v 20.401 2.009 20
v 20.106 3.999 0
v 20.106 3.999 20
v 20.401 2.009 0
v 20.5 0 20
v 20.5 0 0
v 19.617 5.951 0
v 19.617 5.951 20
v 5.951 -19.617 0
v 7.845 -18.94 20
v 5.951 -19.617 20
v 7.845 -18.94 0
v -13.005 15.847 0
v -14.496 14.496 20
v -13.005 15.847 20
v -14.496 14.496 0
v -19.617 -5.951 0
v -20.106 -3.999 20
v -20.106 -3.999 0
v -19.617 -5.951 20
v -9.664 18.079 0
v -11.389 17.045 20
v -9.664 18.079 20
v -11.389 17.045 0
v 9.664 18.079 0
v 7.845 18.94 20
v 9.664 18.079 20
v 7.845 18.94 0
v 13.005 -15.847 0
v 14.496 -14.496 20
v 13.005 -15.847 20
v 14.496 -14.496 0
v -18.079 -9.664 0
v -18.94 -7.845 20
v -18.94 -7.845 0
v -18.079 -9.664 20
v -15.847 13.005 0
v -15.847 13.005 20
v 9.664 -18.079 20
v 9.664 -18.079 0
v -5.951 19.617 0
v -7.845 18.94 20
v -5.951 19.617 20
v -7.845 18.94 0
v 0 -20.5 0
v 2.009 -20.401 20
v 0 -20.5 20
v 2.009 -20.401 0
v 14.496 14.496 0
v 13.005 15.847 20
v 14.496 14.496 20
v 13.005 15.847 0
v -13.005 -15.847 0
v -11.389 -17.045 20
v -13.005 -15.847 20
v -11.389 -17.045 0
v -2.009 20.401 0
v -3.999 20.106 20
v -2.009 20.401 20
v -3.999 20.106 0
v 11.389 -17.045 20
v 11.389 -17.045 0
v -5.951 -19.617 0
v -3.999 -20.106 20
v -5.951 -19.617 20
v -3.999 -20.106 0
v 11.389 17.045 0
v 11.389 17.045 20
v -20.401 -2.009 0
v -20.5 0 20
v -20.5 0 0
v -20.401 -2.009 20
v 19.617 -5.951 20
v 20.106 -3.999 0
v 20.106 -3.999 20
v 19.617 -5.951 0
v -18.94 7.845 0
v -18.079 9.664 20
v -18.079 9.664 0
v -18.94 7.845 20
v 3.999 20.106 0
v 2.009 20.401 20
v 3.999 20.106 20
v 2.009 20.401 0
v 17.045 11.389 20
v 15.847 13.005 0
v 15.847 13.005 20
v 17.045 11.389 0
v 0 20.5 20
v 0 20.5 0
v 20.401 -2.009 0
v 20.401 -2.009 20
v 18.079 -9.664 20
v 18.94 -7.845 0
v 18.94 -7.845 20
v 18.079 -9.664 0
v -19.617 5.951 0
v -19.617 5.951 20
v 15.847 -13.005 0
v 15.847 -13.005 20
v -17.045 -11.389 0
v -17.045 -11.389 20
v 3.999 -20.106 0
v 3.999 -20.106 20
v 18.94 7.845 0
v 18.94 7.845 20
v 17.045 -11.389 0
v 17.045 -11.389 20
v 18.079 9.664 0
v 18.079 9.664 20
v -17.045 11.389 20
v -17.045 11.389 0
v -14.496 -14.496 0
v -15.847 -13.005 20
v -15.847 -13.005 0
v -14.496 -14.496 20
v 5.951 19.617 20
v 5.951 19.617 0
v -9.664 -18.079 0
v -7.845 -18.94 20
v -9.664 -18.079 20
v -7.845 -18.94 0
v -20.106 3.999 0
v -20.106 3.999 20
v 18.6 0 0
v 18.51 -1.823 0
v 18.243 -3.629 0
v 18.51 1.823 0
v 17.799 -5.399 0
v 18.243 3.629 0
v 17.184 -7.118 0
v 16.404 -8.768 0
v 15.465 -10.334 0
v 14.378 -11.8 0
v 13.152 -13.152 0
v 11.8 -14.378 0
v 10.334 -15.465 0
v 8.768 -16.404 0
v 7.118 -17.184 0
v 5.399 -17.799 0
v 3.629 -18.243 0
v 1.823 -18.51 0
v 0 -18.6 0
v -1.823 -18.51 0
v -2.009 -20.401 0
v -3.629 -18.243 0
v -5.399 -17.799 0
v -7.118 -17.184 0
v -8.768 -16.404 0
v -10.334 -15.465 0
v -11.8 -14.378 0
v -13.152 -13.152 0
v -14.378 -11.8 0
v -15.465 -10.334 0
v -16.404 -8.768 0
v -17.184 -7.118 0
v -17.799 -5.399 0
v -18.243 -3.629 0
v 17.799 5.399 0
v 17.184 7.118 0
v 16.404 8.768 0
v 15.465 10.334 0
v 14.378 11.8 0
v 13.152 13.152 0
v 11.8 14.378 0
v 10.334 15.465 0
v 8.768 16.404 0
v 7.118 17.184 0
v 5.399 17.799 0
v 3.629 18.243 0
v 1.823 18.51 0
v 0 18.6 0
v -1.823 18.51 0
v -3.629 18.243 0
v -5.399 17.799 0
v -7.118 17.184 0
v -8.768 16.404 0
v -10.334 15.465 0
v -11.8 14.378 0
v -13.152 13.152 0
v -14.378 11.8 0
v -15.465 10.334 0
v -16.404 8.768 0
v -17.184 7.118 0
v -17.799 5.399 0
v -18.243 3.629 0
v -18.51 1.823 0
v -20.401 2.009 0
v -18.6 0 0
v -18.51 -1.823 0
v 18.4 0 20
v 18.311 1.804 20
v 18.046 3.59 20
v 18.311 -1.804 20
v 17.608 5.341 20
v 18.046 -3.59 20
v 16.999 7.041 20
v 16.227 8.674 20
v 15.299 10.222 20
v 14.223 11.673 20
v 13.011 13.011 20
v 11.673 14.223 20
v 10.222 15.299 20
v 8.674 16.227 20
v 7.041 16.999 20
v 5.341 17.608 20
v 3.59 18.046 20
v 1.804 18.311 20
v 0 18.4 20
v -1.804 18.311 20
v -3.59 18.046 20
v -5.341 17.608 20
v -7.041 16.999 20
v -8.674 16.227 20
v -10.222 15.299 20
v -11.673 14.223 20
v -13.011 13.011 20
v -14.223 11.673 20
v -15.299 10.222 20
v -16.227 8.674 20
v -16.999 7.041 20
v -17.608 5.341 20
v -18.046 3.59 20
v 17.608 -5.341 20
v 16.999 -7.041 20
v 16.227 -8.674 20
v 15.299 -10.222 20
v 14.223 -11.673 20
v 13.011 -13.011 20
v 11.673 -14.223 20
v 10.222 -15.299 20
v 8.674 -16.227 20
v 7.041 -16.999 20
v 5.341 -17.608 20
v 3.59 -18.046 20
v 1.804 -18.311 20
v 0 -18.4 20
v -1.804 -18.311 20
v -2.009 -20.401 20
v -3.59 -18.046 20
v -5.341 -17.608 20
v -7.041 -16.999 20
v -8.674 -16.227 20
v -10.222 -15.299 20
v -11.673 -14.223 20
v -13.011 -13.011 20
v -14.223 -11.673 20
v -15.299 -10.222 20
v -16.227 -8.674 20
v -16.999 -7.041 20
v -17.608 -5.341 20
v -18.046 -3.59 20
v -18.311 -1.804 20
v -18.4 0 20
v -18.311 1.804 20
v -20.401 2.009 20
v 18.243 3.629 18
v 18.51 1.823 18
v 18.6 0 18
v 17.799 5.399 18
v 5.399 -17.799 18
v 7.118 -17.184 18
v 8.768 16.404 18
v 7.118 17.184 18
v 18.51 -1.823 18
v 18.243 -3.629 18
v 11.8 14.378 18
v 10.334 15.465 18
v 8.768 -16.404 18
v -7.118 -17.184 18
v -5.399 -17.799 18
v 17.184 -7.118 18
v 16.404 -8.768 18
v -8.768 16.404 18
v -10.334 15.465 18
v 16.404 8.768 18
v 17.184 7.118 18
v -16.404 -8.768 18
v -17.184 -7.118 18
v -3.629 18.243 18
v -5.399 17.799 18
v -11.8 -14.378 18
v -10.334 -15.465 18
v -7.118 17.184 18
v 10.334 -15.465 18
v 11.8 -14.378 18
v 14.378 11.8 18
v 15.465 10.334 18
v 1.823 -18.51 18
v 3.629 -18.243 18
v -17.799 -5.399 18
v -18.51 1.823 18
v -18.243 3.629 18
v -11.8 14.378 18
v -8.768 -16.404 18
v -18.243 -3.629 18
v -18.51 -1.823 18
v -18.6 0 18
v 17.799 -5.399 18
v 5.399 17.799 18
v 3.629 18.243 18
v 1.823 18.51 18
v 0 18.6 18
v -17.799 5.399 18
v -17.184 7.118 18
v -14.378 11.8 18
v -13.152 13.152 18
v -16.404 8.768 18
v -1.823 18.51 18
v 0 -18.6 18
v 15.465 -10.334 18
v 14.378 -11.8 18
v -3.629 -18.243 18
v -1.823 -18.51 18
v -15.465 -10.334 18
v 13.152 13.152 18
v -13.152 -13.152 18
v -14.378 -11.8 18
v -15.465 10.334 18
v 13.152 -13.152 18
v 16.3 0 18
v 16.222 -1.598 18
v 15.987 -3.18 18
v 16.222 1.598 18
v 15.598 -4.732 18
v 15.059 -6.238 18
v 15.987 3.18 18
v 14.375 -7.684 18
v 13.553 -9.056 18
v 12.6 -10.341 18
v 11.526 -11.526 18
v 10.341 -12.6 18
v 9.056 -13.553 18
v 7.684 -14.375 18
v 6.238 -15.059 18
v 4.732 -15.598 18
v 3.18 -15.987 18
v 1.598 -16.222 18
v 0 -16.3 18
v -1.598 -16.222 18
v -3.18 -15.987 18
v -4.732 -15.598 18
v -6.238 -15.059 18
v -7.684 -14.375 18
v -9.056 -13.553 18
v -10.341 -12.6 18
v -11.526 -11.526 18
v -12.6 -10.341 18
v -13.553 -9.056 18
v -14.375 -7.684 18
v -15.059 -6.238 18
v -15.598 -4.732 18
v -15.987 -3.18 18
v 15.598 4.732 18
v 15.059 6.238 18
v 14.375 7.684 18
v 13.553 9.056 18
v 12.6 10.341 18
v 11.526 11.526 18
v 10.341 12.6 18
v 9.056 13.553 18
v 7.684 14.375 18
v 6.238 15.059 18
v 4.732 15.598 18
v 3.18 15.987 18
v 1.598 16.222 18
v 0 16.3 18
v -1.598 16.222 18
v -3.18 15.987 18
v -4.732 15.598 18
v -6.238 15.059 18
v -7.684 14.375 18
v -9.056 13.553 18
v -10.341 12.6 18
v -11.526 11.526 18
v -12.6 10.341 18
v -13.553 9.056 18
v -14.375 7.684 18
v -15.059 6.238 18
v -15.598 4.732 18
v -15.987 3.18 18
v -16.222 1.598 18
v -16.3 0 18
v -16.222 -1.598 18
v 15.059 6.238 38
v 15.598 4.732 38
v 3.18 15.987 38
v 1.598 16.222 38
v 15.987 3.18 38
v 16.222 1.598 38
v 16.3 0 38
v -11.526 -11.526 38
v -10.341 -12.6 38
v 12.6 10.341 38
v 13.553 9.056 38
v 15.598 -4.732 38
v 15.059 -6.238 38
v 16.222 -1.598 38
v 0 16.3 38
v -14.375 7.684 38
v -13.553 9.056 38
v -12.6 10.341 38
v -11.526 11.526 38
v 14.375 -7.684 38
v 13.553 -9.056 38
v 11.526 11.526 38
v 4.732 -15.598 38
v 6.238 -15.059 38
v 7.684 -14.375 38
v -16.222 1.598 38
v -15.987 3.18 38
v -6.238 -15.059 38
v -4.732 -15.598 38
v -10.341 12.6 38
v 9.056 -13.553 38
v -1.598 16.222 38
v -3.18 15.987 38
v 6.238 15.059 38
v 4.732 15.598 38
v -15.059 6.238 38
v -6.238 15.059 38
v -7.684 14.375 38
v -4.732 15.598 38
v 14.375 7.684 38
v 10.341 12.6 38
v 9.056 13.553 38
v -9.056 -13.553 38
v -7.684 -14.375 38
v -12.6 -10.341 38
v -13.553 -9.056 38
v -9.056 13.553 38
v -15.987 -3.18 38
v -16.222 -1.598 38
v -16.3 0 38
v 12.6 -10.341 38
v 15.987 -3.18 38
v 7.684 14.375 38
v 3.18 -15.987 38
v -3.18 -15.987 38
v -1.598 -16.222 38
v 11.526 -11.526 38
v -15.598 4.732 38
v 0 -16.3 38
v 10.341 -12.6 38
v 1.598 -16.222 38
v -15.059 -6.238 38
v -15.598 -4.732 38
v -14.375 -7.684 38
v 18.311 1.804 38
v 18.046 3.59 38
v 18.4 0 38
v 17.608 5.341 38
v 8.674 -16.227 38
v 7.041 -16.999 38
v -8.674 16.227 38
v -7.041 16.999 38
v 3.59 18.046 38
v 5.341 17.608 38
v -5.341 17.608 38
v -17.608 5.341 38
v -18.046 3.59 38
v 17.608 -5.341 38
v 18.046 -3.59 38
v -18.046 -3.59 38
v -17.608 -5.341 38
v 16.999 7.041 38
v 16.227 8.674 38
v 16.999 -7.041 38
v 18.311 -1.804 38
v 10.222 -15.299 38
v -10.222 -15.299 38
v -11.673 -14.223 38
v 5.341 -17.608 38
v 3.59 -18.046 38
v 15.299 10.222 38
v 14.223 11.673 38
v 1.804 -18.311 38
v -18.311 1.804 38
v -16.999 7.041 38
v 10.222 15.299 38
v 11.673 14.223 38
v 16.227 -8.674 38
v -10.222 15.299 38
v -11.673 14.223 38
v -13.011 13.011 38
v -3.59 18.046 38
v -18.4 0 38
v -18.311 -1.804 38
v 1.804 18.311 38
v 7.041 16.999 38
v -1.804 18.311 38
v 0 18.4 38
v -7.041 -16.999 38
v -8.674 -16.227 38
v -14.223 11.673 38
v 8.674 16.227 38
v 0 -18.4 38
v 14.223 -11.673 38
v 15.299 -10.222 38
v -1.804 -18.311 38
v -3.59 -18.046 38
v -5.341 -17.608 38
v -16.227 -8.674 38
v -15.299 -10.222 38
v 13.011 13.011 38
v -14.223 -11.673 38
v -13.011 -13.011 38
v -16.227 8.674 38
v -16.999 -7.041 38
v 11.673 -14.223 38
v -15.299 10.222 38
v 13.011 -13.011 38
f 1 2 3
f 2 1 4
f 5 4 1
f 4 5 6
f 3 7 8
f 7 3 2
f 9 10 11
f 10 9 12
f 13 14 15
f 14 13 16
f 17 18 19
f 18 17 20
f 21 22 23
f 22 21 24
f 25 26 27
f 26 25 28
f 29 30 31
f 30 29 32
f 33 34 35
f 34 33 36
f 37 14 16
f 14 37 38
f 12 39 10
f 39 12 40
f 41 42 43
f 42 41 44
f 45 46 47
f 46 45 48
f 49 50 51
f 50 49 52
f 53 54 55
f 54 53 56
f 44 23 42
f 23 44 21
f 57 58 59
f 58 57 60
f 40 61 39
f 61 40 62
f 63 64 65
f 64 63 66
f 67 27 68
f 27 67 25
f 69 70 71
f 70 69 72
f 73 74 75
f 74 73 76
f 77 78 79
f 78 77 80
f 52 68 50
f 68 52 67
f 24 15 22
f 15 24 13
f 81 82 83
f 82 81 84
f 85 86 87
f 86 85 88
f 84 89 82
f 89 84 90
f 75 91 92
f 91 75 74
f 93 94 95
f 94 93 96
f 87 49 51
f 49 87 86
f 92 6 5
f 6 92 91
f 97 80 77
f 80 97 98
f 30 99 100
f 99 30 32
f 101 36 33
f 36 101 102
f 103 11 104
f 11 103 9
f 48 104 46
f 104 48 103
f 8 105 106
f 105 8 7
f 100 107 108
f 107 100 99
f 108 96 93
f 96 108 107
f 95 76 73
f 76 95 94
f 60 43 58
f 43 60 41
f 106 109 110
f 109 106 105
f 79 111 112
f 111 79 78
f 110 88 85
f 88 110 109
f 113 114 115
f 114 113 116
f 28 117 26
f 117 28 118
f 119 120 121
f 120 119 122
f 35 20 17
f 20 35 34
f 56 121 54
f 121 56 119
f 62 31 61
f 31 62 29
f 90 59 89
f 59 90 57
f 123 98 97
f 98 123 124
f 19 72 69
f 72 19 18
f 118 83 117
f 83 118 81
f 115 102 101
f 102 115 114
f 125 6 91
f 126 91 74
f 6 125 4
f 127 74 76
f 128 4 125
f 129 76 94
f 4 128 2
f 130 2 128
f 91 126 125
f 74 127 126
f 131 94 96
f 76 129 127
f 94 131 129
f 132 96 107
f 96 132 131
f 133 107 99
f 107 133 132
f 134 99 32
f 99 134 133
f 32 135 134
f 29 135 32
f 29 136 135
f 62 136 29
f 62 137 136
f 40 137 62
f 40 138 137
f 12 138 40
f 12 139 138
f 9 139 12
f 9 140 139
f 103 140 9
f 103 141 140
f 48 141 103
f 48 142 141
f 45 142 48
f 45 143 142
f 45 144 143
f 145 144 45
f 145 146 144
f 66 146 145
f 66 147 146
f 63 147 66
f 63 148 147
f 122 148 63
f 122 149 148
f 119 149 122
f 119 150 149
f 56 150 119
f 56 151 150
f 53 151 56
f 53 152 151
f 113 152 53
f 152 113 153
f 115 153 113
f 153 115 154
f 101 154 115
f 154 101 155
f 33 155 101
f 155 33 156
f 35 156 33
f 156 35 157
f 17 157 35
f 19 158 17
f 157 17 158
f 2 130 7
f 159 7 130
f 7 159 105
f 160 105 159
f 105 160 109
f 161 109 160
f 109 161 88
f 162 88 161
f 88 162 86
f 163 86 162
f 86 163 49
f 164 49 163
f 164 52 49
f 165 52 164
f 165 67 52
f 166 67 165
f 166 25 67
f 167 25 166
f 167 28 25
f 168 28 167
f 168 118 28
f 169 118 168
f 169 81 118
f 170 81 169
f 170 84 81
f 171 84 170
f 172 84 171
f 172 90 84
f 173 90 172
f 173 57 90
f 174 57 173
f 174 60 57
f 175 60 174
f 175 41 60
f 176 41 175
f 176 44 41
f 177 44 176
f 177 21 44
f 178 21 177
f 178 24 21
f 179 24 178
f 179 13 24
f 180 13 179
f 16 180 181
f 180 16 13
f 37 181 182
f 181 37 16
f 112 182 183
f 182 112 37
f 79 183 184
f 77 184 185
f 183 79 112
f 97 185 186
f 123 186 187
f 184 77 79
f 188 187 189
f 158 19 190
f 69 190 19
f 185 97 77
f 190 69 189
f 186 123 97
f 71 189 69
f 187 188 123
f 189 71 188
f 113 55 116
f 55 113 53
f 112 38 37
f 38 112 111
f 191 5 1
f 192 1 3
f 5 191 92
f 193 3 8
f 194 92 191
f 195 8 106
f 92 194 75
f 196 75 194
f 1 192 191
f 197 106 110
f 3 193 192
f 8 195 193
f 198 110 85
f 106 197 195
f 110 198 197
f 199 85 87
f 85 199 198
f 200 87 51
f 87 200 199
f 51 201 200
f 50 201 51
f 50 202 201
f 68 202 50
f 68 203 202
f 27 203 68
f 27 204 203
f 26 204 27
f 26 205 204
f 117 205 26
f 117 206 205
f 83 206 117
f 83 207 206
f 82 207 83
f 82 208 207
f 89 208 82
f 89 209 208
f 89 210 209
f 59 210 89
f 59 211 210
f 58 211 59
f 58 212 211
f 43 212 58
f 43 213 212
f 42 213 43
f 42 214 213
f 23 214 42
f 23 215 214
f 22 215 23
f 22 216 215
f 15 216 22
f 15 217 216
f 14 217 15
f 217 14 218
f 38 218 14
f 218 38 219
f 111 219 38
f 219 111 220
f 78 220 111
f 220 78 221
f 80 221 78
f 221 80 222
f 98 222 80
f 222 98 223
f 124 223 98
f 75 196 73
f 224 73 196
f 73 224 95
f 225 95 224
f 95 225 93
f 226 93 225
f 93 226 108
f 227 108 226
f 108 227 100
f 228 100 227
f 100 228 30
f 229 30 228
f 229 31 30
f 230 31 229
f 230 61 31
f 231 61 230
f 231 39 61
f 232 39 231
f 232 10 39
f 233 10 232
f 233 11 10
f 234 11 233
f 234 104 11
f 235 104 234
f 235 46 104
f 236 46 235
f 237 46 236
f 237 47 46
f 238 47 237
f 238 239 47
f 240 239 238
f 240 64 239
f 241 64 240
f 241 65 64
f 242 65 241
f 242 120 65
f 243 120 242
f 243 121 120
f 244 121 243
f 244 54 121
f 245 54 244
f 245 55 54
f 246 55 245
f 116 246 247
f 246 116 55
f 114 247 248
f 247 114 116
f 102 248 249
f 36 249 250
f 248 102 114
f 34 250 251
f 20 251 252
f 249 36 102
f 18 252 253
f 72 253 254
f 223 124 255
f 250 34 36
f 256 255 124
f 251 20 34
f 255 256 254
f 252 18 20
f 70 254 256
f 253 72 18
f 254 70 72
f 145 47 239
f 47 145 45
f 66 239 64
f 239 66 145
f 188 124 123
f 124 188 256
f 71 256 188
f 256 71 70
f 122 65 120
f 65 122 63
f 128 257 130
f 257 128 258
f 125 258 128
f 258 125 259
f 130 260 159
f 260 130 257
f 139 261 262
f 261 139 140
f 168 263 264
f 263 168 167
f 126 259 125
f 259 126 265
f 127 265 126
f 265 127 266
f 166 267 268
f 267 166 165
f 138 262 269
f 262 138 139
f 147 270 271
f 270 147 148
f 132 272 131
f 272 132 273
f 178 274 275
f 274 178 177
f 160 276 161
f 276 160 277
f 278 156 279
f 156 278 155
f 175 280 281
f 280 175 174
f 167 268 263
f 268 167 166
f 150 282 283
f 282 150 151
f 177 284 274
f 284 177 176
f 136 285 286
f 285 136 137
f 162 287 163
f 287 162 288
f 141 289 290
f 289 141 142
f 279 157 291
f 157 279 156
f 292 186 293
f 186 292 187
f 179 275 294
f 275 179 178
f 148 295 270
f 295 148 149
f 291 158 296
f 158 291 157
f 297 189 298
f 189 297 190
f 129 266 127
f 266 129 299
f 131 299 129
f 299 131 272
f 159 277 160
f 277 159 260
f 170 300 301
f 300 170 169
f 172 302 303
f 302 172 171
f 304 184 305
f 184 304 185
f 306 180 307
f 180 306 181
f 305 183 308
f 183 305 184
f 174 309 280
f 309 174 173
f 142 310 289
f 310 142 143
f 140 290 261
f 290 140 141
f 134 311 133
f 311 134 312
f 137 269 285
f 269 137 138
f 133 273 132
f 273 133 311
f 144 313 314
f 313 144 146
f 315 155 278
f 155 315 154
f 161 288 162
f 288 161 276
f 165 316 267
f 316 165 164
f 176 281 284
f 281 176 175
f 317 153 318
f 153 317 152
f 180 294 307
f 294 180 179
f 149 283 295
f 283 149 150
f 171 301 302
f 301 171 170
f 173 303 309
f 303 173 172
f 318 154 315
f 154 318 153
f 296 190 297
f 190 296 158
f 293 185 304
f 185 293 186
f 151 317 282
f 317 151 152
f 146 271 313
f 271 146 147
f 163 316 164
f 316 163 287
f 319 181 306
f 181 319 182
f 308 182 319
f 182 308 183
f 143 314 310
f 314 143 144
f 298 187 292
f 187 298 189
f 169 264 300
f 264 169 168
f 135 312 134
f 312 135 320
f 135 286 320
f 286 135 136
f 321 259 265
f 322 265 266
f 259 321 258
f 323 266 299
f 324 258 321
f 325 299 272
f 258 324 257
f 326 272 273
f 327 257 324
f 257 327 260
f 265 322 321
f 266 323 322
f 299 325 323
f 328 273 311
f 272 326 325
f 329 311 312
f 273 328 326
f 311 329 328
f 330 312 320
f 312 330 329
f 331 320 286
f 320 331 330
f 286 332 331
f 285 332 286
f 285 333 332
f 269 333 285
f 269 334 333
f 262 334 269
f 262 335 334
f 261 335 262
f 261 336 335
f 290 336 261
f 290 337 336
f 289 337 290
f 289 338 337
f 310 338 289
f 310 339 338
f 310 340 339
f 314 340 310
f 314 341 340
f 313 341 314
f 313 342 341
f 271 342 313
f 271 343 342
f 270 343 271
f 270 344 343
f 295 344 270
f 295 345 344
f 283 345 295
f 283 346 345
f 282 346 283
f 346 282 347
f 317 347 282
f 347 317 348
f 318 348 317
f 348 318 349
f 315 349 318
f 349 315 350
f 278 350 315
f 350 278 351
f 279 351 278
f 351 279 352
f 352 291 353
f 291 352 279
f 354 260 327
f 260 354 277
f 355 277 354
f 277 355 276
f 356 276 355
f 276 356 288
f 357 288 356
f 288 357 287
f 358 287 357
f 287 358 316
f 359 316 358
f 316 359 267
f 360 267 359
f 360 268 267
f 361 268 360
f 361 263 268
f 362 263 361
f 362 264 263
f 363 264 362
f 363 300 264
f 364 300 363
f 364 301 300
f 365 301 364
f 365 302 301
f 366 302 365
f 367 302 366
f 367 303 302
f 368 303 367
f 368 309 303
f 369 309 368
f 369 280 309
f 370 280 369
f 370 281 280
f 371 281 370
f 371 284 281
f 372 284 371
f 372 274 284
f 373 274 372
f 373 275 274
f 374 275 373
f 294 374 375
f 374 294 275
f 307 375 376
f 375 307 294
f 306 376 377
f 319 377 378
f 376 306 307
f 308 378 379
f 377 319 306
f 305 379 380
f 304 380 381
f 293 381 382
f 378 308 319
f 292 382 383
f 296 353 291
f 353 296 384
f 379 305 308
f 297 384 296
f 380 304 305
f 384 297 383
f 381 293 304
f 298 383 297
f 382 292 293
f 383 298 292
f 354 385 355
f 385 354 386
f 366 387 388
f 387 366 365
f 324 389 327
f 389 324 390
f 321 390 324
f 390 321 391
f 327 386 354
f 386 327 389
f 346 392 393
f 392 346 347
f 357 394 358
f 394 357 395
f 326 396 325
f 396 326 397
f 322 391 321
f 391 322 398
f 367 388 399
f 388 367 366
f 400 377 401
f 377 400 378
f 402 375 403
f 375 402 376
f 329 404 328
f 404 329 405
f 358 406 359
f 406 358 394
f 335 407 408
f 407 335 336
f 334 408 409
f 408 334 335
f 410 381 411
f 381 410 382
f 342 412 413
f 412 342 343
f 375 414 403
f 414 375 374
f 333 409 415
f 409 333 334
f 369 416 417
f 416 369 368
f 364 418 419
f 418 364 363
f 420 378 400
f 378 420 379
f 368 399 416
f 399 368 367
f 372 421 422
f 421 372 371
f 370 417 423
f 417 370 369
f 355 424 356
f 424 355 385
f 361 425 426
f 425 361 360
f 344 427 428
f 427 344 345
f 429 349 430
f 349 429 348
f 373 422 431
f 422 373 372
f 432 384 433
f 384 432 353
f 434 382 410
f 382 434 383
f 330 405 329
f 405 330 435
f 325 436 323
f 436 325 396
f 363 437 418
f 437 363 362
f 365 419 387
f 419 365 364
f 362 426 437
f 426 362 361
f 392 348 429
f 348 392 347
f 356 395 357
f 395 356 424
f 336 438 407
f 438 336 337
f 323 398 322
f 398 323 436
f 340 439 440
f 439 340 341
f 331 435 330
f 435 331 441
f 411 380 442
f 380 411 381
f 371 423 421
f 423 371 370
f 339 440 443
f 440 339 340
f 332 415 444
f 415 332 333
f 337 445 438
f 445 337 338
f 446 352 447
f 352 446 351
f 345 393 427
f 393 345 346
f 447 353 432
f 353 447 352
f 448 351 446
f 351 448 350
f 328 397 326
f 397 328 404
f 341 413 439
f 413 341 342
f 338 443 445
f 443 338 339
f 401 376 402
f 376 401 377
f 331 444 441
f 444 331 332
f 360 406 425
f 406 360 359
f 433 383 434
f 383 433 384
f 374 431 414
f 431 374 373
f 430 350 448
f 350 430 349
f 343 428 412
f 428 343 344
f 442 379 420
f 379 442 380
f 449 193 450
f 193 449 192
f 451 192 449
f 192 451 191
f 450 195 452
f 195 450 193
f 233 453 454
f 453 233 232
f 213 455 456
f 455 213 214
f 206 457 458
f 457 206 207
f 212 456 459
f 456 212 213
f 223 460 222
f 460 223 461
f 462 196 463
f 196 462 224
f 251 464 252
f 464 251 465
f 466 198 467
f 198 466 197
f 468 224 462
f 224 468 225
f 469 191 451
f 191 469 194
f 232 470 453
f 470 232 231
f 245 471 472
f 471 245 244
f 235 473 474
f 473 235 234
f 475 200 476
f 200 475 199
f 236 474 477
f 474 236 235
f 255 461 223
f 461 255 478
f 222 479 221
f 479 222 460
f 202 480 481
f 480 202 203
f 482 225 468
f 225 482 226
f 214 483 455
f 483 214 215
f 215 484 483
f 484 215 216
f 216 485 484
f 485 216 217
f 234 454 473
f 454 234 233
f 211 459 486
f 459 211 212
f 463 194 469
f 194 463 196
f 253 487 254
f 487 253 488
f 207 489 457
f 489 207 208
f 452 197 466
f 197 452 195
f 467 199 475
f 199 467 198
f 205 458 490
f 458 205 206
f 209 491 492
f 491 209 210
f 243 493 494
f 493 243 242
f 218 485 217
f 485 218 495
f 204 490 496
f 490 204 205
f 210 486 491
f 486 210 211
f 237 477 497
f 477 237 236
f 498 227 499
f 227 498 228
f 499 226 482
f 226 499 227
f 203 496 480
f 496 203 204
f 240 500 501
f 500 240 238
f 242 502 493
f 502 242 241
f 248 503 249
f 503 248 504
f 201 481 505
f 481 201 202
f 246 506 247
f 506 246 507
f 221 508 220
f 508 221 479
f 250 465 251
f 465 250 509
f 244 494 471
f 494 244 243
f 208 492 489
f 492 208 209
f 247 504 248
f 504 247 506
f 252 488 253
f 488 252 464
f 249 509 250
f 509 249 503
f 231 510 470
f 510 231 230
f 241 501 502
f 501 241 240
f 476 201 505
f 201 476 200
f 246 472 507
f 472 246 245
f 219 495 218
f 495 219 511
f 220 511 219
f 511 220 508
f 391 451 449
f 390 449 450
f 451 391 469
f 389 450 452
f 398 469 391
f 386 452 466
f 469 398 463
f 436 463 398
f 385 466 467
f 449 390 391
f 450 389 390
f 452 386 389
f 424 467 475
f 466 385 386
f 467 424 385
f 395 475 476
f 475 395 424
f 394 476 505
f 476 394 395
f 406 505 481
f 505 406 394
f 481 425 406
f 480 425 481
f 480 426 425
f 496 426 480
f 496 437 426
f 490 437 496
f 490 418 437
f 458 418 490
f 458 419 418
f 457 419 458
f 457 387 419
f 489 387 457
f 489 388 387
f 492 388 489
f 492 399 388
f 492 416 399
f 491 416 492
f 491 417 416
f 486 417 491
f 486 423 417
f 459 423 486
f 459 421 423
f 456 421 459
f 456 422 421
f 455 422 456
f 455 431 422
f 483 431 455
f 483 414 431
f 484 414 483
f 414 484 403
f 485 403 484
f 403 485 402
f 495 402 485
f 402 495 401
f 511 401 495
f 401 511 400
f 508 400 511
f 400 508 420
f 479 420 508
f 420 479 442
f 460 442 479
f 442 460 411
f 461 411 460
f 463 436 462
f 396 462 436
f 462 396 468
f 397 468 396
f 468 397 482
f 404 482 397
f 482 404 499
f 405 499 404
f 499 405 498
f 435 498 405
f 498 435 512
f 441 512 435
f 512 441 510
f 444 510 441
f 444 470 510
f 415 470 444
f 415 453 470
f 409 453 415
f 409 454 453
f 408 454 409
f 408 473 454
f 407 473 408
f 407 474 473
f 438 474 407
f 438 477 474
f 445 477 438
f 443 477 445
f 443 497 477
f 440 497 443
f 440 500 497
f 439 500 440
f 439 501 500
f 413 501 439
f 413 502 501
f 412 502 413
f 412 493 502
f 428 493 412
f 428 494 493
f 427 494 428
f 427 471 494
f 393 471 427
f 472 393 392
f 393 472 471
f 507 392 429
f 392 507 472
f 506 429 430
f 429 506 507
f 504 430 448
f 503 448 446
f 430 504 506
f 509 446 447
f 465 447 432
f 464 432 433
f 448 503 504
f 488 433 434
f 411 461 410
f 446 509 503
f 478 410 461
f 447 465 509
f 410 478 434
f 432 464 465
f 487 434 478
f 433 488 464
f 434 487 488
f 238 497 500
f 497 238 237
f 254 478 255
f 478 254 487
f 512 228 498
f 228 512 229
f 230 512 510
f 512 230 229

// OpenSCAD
/*
Parametric Fellowes Monitor Stand Legs

Copyright 2024 nomike[AT]nomike[DOT]com

Redistribution and use in source and binary forms, with or without
modification, are permitted provided that the following conditions are met:

1. Redistributions of source code must retain the above copyright notice, this
list of conditions and the following disclaimer.

2. Redistributions in binary form must reproduce the above copyright notice,
this list of conditions and the following disclaimer in the documentation
and/or other materials provided with the distribution.

THIS SOFTWARE IS PROVIDED BY THE COPYRIGHT HOLDERS AND CONTRIBUTORS “AS IS” AND
ANY EXPRESS OR IMPLIED WARRANTIES, INCLUDING, BUT NOT LIMITED TO, THE IMPLIED
WARRANTIES OF MERCHANTABILITY AND FITNESS FOR A PARTICULAR PURPOSE ARE
DISCLAIMED. IN NO EVENT SHALL THE COPYRIGHT HOLDER OR CONTRIBUTORS BE LIABLE FOR
ANY DIRECT, INDIRECT, INCIDENTAL, SPECIAL, EXEMPLARY, OR CONSEQUENTIAL DAMAGES
(INCLUDING, BUT NOT LIMITED TO, PROCUREMENT OF SUBSTITUTE GOODS OR SERVICES;
LOSS OF USE, DATA, OR PROFITS; OR BUSINESS INTERRUPTION) HOWEVER CAUSED AND ON
ANY THEORY OF LIABILITY, WHETHER IN CONTRACT, STRICT LIABILITY, OR TORT
(INCLUDING NEGLIGENCE OR OTHERWISE) ARISING IN ANY WAY OUT OF THE USE OF THIS
SOFTWARE, EVEN IF ADVISED OF THE POSSIBILITY OF SUCH DAMAGE.

*/

/* [height] */
base_height = 20;


/* [if you change any of these values, the legs might no longer fit] */
base_outer_diameter = 20.5;
base_inner_diameter = 18.6;

top_height = 18;
top_outer_diameter = 18.4;
top_inner_diameter = 16.3;


min_base_height = 18;

_total_height = base_height + top_height;

$fn = 64;

union() {
    difference() {
        cylinder(h = max(base_height, min_base_height), r = base_outer_diameter);
        cylinder(h = max(base_height, min_base_height), r = base_inner_diameter);
    }
    
    difference() {
        translate([0, 0, max(base_height, min_base_height) - 2]) cylinder(h = 2, r = base_inner_diameter);
        translate([0, 0, max(base_height, min_base_height) - 2]) cylinder(h = 2, r = top_inner_diameter);
    }
    
    translate([0, 0, max(base_height, min_base_height)]) difference() {
        cylinder(h = top_height, r = top_outer_diameter);
        cylinder(h = top_height, r = top_inner_diameter);
    }
    
}
